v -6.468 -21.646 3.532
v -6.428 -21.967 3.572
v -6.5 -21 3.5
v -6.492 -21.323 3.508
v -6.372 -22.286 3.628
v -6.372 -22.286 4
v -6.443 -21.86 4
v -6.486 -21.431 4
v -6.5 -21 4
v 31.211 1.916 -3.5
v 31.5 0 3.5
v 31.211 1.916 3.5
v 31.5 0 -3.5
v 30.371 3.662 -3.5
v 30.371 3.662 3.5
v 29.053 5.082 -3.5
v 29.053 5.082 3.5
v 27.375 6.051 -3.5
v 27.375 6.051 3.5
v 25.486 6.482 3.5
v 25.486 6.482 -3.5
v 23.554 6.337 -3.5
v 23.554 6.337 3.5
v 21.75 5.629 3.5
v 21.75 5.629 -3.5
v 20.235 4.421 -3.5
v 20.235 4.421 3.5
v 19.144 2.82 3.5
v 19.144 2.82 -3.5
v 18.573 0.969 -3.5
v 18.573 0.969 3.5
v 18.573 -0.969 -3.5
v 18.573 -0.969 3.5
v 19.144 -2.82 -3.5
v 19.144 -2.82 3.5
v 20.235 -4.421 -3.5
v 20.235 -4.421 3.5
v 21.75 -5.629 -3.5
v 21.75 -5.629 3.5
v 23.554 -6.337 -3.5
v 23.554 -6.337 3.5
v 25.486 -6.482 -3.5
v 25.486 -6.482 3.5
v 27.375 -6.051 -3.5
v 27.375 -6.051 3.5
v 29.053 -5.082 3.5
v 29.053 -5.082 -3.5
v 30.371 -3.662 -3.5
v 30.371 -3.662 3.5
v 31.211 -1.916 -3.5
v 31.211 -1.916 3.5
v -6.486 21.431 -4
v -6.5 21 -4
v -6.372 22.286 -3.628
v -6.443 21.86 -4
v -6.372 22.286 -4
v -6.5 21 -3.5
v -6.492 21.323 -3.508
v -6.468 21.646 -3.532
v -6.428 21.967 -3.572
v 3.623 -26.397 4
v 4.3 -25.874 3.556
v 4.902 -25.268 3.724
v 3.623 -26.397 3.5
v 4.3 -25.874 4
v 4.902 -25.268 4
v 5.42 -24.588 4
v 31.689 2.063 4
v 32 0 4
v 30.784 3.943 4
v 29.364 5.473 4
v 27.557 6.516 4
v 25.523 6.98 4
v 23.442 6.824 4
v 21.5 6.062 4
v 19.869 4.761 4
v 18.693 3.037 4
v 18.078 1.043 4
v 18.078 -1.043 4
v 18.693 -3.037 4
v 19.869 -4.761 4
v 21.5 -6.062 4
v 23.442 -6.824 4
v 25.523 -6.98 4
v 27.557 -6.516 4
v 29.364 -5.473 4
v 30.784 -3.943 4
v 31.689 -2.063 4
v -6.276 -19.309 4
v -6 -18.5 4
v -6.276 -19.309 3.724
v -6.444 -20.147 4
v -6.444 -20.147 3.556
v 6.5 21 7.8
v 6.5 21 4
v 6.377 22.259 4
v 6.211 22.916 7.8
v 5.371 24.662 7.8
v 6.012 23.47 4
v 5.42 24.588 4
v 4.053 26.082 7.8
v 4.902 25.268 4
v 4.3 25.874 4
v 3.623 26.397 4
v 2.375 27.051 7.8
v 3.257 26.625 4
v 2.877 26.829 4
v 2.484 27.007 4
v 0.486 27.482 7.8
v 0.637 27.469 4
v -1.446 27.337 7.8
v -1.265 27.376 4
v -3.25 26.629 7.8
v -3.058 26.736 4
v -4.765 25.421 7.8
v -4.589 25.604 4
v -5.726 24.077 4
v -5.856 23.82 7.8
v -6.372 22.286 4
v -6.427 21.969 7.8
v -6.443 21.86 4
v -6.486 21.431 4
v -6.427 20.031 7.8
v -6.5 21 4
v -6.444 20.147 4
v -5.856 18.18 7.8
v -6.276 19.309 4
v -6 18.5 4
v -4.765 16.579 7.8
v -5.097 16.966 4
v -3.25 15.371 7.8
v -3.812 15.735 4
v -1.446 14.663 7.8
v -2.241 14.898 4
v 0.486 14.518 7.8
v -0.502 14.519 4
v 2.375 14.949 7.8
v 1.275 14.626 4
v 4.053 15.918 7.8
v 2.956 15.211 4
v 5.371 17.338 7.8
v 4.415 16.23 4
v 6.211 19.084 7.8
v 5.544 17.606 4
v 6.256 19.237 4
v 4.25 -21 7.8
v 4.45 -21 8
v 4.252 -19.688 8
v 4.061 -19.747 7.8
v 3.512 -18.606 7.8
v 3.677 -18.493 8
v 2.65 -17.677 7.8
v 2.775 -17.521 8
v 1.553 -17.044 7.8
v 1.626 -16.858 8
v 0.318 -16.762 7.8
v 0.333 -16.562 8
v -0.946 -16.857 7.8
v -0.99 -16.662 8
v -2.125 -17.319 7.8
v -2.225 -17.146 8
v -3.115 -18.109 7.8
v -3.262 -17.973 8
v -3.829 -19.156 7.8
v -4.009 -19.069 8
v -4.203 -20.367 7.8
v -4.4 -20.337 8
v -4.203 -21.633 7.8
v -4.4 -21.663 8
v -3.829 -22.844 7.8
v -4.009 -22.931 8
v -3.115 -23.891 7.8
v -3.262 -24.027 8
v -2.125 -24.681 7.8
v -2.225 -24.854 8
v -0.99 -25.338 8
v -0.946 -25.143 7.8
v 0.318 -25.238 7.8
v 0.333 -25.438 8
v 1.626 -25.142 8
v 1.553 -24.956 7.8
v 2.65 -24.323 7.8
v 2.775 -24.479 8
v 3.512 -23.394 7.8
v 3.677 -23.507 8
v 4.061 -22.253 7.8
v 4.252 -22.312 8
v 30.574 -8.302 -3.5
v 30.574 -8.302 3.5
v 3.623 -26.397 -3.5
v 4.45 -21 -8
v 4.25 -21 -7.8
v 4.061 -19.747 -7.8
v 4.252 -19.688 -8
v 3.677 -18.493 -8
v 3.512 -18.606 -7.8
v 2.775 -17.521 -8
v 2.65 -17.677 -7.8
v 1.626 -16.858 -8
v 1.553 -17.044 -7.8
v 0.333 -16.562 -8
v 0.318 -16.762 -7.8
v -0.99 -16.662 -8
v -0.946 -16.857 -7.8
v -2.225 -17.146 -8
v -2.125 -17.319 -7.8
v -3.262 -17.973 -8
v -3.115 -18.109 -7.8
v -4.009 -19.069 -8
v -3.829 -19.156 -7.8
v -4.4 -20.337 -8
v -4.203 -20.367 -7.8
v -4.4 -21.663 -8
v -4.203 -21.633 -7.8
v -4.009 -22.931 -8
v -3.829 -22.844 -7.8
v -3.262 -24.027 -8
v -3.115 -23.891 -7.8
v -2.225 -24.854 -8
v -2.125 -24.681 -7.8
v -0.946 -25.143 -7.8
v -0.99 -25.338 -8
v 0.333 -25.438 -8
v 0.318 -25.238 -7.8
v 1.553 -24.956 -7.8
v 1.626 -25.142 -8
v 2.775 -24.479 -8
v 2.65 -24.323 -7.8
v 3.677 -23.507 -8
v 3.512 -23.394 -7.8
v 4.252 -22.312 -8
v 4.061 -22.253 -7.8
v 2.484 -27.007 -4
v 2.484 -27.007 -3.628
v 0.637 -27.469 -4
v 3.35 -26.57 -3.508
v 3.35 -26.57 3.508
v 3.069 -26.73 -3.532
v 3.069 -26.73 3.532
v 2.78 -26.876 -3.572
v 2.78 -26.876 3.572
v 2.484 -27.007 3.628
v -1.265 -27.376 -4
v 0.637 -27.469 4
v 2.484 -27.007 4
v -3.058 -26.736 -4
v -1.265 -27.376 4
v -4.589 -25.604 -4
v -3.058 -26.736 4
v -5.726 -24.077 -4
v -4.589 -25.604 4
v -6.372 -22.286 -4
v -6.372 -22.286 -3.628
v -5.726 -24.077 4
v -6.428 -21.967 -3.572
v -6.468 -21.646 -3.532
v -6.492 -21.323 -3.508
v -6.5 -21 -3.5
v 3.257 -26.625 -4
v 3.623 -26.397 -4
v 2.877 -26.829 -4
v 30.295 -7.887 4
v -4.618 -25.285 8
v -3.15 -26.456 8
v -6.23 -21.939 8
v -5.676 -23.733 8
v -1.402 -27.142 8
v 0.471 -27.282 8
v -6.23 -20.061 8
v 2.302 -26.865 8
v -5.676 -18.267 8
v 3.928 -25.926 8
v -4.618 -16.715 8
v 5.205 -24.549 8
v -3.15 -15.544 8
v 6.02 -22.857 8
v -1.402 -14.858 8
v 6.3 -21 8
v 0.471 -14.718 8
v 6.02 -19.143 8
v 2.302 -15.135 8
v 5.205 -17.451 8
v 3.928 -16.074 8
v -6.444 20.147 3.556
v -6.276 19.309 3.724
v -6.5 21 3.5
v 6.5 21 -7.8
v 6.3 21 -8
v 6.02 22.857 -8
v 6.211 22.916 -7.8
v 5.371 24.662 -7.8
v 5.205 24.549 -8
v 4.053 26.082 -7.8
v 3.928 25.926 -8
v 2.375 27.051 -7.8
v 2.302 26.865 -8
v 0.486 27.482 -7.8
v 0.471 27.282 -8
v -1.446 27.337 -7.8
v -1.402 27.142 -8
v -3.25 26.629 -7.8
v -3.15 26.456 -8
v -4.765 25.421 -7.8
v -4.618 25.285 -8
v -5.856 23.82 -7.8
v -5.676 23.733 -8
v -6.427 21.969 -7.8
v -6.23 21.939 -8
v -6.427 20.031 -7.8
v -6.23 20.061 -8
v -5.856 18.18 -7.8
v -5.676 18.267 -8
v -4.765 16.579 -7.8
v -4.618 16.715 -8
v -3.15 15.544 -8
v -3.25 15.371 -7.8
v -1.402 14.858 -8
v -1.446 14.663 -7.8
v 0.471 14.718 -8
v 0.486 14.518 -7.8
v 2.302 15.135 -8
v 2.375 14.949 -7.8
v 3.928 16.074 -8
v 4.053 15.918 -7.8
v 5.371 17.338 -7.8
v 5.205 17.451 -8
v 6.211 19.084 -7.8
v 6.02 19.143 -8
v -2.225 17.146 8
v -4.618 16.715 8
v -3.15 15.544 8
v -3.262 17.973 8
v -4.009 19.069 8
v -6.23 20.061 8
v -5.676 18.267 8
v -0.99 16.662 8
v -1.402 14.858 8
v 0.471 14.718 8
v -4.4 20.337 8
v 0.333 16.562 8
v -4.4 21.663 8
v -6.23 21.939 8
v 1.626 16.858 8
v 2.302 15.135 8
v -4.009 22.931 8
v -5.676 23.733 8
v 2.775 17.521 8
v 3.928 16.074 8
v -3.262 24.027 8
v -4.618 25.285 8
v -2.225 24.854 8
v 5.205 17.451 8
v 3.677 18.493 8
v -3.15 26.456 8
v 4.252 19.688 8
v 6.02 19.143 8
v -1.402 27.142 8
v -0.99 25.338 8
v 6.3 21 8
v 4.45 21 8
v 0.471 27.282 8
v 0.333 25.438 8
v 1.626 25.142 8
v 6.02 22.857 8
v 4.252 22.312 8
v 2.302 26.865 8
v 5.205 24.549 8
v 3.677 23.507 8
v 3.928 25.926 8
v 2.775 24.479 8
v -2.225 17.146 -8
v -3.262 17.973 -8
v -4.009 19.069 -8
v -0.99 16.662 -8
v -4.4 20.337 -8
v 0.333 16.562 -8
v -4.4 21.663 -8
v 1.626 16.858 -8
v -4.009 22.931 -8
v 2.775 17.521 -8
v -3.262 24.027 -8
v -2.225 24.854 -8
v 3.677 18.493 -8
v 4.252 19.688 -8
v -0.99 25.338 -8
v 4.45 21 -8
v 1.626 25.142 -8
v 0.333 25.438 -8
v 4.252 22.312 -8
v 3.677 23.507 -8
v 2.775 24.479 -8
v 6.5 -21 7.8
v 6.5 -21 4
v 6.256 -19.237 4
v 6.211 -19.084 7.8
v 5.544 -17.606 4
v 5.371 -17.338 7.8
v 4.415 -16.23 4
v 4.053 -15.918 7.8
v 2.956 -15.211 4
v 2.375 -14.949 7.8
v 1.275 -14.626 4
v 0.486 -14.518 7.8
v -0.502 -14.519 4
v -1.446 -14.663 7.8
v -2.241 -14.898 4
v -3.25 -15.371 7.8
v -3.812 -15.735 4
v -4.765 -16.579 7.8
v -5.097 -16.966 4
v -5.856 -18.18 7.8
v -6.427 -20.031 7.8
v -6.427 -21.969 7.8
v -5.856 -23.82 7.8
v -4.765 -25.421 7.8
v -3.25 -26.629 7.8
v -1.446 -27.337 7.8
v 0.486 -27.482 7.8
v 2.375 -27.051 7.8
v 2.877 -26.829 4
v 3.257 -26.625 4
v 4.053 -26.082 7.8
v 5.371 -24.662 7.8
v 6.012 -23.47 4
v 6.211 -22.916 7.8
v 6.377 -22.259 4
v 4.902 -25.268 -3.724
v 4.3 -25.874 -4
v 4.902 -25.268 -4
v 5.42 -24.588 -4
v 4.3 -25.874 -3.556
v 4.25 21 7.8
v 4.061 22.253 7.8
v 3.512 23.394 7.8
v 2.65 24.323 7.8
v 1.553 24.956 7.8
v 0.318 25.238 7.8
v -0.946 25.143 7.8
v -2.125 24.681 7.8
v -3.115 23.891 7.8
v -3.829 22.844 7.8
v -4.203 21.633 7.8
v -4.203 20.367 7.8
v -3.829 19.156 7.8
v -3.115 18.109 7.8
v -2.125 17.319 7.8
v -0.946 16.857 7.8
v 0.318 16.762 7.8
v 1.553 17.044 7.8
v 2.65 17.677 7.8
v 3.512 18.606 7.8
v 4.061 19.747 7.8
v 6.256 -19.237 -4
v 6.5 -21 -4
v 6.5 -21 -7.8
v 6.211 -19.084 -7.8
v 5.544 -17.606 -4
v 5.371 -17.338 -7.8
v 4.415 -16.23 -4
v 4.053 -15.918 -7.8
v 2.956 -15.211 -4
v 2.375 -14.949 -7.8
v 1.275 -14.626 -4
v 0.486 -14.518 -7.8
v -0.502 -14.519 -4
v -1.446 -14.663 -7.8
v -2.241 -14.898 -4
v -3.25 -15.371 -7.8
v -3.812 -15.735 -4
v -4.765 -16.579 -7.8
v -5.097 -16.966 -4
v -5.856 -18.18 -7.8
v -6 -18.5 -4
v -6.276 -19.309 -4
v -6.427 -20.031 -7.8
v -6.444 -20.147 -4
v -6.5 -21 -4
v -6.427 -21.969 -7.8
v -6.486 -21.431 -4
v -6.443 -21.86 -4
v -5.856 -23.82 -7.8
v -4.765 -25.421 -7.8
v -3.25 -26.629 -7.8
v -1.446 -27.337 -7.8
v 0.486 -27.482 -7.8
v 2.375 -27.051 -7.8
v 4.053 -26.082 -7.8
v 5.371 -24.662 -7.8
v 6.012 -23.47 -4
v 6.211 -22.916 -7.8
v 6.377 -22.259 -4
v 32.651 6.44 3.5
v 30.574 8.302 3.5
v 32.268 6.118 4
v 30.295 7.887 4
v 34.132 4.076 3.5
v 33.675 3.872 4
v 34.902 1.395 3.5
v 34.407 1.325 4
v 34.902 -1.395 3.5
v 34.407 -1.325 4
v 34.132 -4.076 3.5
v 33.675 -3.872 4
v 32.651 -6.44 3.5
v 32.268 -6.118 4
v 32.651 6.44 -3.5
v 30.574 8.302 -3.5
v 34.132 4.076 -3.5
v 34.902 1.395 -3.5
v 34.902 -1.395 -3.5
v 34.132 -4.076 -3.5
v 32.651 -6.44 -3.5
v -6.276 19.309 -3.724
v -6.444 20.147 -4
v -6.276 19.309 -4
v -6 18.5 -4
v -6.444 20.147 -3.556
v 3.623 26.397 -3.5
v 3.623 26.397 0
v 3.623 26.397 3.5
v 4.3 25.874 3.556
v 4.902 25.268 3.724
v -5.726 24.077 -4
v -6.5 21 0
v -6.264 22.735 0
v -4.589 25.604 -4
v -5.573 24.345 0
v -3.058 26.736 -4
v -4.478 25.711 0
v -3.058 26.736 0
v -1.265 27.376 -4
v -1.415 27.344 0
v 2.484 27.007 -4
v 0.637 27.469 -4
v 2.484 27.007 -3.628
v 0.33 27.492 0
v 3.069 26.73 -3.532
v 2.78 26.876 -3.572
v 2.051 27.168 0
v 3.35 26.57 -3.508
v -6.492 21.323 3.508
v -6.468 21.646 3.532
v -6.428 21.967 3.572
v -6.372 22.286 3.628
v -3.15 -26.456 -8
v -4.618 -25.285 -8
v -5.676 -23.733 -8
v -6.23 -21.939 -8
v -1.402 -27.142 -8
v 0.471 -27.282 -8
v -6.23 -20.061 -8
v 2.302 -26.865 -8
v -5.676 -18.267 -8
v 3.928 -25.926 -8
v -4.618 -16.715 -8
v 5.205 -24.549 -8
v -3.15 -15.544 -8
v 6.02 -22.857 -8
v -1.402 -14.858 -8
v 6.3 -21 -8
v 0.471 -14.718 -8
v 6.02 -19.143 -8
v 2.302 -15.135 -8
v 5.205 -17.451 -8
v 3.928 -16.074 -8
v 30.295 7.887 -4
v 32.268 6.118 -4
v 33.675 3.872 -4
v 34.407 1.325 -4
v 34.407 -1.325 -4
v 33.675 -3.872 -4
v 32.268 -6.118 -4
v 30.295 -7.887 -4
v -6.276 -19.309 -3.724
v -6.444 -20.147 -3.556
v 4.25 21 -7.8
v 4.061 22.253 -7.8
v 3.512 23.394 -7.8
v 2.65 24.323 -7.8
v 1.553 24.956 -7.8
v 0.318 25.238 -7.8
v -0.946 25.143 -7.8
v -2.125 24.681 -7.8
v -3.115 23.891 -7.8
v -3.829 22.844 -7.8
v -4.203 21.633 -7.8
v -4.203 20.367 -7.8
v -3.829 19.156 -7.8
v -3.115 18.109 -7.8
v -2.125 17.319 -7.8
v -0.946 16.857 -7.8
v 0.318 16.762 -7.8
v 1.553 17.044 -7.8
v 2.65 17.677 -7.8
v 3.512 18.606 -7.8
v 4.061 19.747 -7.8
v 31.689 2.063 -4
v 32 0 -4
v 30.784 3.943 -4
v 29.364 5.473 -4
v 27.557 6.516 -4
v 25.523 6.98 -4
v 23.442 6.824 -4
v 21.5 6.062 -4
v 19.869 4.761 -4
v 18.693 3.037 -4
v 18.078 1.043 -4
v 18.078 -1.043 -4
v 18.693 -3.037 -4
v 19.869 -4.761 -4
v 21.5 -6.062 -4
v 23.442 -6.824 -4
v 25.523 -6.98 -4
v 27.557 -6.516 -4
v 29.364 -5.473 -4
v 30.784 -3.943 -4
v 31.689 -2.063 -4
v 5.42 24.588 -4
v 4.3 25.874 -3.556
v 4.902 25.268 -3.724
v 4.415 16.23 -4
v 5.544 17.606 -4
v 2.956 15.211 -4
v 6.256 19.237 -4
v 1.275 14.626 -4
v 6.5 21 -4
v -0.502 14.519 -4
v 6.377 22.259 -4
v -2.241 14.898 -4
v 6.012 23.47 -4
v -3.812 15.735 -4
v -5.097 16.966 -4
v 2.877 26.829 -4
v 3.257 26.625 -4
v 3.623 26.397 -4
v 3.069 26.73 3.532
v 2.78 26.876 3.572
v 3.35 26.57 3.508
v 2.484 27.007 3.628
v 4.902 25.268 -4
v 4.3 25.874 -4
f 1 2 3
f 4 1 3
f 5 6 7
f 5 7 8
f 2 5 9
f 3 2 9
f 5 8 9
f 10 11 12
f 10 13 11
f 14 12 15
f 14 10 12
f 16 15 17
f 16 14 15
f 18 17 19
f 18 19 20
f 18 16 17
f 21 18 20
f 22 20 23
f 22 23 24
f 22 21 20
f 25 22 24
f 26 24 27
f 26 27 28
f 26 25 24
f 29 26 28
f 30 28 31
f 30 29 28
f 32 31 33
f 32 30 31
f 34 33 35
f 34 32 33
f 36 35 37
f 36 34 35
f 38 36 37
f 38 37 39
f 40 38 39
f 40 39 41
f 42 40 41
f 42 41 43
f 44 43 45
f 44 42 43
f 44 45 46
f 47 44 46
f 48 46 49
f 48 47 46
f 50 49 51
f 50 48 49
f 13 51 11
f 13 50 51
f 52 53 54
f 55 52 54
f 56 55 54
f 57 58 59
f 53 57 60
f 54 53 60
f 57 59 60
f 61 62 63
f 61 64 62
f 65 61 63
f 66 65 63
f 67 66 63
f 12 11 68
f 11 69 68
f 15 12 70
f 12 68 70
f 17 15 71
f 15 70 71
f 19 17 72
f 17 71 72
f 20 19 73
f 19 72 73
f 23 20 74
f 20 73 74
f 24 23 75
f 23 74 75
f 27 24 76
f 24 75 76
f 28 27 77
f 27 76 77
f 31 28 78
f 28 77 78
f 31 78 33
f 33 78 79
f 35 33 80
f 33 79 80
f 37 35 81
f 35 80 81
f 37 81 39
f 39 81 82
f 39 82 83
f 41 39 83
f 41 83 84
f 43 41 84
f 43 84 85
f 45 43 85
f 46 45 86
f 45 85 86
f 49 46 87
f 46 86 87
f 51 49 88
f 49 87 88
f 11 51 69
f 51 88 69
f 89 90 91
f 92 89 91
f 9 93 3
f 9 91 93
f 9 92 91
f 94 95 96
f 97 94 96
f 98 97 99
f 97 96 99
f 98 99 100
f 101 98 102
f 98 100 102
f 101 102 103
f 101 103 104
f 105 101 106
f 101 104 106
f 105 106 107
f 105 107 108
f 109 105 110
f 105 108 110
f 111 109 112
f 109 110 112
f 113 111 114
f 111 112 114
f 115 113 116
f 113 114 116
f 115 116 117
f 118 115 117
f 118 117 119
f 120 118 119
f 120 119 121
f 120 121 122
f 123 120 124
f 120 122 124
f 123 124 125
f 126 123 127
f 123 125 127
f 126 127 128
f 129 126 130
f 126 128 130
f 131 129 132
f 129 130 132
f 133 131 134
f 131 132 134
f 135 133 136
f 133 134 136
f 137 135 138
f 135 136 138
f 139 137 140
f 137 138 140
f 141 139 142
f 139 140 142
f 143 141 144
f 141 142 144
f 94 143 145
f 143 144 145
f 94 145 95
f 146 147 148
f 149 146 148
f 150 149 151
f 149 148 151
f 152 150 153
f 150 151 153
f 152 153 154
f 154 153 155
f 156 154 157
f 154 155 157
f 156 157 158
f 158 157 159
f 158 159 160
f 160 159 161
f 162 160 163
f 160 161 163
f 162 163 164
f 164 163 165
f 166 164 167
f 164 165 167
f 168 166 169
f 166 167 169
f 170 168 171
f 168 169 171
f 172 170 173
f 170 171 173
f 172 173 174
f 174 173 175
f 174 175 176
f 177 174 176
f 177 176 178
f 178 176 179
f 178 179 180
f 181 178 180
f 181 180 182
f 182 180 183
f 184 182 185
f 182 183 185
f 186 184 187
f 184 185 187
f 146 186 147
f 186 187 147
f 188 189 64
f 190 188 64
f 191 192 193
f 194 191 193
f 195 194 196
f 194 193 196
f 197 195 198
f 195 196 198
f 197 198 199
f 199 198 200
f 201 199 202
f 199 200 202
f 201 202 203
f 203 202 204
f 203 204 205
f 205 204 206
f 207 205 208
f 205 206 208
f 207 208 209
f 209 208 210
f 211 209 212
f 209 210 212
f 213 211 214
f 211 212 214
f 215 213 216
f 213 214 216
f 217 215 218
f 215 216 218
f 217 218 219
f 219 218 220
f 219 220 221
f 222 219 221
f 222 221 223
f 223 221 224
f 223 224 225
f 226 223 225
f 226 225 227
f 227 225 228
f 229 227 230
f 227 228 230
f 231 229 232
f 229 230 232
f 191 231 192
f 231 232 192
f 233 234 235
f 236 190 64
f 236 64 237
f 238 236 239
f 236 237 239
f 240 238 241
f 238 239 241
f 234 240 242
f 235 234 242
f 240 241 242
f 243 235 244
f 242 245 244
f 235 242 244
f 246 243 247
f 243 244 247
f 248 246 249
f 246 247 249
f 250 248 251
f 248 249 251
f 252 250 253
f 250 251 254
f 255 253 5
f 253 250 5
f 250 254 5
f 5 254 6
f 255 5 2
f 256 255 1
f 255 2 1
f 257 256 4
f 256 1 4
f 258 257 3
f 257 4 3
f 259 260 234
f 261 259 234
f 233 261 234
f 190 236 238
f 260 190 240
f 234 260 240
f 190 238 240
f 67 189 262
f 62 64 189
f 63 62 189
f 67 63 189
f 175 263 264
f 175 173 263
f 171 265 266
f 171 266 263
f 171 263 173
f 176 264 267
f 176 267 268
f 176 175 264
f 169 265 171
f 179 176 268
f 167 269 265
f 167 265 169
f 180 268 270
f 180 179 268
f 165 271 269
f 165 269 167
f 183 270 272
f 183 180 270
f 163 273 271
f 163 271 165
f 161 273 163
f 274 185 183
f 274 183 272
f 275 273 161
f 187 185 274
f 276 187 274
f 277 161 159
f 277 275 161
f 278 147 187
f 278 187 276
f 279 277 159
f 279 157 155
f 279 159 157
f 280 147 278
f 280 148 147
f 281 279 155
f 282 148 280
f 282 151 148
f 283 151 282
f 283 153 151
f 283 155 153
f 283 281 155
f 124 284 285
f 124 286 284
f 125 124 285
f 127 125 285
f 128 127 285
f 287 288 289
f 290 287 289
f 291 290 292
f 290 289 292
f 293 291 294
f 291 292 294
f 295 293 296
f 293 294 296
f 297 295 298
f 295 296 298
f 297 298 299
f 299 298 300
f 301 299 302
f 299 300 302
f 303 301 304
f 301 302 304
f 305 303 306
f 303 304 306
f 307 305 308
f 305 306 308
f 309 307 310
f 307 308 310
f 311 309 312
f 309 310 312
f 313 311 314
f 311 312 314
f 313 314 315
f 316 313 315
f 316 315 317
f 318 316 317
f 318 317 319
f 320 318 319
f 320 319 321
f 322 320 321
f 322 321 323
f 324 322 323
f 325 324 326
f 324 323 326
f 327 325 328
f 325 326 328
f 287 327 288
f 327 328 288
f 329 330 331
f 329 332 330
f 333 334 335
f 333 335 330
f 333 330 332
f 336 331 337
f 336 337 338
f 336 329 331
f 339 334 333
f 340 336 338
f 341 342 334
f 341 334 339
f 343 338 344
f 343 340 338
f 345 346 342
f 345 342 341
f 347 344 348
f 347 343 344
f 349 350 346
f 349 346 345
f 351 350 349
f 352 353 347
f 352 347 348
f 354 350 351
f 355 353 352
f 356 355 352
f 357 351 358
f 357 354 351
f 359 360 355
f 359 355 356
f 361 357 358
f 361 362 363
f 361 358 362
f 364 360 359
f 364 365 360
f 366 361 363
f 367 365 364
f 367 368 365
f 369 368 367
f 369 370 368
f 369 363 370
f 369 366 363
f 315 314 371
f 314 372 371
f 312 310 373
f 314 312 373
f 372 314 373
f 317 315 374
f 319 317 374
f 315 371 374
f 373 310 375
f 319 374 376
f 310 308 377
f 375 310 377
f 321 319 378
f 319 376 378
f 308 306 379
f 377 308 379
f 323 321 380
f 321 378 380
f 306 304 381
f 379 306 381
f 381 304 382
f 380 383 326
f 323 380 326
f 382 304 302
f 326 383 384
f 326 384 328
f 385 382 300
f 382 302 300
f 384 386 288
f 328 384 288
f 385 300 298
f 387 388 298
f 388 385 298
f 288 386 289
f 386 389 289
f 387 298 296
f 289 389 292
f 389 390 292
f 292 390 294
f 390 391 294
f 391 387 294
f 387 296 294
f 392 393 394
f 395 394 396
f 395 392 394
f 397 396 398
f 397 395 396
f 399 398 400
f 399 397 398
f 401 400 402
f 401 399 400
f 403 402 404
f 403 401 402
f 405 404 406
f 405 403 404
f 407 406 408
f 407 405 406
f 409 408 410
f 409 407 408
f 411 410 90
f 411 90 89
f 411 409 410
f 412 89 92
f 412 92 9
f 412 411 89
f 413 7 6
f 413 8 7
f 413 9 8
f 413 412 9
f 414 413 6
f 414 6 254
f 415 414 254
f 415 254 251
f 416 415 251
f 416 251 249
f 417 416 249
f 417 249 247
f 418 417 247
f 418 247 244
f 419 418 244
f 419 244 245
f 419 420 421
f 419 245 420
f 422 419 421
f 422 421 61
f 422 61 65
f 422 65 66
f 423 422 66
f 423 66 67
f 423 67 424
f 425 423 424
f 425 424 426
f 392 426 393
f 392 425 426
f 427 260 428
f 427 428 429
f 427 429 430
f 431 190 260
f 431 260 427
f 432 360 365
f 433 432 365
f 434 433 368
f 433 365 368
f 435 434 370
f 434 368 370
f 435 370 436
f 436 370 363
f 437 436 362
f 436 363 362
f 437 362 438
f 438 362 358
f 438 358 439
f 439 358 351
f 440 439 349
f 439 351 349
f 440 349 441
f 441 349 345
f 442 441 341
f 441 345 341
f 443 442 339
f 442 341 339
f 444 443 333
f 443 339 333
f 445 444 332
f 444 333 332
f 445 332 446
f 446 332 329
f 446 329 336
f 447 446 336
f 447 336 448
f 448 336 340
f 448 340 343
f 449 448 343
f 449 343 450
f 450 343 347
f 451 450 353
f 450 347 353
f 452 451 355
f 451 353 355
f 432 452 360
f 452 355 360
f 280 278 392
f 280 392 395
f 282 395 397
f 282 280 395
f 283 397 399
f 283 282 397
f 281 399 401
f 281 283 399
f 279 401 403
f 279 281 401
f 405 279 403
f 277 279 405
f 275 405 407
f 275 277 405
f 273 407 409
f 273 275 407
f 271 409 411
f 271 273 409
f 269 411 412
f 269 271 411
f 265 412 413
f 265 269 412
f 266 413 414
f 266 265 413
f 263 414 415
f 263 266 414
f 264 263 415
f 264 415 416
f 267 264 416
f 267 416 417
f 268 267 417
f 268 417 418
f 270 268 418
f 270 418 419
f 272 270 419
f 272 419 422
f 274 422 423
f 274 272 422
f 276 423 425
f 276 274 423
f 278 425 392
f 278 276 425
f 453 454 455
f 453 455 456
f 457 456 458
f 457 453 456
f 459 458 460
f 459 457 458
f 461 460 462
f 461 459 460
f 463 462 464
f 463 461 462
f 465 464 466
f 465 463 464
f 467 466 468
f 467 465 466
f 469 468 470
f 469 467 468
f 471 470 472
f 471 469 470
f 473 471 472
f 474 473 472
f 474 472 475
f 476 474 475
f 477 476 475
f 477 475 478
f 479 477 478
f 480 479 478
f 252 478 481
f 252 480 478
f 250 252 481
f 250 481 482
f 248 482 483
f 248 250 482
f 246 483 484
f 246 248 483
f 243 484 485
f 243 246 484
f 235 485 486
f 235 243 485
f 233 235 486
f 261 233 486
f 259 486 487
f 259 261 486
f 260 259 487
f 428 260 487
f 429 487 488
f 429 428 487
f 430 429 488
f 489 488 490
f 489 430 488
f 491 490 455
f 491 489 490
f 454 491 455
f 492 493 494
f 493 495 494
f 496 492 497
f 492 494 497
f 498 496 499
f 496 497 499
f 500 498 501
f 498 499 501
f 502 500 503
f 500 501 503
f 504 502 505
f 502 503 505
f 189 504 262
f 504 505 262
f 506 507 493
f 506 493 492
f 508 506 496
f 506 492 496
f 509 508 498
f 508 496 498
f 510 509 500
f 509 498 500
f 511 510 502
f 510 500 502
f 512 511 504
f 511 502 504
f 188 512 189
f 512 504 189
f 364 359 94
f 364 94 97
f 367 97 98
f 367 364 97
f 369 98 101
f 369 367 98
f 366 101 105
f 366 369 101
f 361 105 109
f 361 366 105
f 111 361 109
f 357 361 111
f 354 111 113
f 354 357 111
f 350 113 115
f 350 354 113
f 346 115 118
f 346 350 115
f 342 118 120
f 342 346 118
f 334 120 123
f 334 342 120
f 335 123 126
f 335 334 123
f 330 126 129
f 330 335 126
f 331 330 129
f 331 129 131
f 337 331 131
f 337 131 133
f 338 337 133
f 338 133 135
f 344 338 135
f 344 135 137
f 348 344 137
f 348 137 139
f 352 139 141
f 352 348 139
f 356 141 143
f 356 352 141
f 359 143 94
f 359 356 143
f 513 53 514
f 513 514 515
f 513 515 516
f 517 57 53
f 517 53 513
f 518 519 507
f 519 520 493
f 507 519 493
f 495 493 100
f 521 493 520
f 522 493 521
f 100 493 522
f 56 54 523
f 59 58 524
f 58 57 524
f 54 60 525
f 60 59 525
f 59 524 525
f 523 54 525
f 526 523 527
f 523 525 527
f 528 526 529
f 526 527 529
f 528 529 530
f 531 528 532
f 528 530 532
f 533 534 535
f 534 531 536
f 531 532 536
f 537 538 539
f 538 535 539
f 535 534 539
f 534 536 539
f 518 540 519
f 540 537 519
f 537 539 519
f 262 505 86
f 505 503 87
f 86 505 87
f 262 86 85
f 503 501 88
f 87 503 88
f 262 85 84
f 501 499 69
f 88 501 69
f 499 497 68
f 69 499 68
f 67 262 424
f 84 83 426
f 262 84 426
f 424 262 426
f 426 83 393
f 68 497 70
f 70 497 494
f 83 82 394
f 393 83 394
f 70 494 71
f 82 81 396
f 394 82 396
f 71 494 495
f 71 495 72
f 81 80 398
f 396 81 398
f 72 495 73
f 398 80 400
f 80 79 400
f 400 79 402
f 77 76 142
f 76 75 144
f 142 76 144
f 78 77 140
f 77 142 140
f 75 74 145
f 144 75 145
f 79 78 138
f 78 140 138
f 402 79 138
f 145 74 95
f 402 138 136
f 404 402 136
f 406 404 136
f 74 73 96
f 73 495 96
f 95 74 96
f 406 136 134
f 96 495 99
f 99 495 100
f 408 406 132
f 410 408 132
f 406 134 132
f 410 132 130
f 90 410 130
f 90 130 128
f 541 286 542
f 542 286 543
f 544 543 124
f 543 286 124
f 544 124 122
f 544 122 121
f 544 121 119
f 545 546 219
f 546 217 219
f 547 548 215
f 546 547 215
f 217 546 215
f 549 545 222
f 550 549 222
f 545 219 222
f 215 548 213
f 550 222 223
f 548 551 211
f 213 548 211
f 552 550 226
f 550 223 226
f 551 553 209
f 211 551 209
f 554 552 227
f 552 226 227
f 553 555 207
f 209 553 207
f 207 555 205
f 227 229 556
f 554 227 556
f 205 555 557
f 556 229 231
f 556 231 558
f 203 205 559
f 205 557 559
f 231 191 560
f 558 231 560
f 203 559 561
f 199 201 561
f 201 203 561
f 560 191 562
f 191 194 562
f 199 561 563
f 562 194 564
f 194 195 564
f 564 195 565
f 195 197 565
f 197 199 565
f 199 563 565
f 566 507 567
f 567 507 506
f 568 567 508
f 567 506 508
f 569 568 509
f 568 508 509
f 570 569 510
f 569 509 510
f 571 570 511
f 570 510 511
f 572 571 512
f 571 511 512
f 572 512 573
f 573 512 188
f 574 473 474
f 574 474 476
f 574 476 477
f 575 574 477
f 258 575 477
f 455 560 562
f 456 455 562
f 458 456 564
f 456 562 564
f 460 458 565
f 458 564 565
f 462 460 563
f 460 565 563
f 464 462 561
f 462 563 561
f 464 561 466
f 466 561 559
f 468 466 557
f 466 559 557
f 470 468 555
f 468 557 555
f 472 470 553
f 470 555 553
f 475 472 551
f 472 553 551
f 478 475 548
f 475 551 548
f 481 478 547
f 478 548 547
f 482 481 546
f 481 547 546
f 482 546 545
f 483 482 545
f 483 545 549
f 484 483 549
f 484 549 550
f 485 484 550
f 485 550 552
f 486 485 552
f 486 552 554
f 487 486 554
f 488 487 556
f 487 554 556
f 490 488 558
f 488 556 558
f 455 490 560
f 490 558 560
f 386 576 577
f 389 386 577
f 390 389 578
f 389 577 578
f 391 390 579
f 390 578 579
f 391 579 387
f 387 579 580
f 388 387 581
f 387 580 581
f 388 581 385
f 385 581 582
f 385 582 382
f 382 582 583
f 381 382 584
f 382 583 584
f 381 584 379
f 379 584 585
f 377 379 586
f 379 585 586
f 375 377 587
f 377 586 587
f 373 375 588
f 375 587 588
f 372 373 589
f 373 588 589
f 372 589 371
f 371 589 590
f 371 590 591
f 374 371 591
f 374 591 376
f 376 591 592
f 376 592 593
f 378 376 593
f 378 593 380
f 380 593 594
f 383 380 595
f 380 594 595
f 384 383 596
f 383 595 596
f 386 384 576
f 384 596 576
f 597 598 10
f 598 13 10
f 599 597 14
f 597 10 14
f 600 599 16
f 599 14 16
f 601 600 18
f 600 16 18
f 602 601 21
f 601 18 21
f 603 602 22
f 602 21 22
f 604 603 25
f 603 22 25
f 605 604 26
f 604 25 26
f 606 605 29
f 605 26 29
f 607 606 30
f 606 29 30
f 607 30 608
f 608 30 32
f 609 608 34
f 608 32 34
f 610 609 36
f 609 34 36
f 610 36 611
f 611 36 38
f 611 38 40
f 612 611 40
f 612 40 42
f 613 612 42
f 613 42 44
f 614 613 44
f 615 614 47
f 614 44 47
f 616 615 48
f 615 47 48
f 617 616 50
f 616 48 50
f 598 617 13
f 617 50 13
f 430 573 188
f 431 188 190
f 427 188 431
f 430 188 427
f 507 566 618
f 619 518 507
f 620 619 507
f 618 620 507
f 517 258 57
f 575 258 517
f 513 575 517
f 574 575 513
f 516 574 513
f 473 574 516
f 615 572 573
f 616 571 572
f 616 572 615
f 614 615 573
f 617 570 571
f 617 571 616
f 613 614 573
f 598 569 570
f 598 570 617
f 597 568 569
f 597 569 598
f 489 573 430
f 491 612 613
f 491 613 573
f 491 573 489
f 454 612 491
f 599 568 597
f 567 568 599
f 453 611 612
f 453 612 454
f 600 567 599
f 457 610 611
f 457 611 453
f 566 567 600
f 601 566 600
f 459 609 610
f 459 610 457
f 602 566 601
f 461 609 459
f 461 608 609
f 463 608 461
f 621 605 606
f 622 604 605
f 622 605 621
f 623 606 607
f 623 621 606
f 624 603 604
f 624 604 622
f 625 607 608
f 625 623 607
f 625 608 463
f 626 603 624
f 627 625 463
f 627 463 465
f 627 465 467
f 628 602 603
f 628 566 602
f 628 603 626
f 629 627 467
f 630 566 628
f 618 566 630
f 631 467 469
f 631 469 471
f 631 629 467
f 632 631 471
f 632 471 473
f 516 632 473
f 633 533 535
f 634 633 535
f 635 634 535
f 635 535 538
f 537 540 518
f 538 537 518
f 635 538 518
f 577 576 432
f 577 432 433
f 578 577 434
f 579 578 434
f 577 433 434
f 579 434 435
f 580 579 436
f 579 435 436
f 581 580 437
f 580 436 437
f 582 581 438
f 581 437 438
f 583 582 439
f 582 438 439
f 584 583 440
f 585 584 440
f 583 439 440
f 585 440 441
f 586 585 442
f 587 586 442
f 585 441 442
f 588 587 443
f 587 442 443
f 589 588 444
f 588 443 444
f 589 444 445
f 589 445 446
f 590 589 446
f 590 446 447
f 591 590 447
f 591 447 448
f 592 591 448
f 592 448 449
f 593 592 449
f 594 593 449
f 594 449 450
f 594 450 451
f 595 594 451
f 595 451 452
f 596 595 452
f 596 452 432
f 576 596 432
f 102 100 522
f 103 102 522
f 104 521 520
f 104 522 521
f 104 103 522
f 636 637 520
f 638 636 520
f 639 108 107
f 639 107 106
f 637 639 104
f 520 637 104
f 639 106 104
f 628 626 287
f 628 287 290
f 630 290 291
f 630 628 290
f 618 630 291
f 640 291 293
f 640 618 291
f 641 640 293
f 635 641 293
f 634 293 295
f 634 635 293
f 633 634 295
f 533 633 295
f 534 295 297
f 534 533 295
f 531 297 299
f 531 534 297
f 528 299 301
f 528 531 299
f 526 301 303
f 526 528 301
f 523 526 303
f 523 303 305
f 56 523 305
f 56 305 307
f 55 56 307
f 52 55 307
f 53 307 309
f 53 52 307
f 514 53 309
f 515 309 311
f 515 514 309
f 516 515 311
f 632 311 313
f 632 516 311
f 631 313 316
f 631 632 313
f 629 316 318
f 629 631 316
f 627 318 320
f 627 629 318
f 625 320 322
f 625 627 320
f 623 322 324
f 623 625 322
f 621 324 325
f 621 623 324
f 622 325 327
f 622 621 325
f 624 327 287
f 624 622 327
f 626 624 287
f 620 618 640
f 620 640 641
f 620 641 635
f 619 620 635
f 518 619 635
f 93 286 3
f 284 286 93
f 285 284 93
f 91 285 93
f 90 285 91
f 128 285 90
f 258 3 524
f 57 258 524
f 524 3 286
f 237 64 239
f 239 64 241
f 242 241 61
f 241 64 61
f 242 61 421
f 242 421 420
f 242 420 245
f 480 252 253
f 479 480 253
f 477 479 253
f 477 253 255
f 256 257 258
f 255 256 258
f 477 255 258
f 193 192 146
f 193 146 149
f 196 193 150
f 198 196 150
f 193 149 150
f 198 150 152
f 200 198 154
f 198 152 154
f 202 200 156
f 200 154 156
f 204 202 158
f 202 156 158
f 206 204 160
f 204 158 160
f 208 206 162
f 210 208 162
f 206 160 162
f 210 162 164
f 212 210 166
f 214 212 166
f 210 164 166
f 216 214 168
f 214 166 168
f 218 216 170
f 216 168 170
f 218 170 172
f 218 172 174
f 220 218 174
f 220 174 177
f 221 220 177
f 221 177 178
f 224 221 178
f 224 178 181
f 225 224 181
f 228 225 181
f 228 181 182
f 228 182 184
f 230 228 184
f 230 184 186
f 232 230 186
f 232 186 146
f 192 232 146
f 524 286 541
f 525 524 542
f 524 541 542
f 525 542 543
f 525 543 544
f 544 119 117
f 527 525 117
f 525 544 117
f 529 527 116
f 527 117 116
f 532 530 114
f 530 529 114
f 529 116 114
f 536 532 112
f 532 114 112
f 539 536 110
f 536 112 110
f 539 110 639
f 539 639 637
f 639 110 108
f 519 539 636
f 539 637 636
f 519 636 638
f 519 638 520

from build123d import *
from build123d.topology import SkipClean

# Parameters (mm, degrees)
SKETCH1_R           = 6.5
BOSS_EXTRUDE1_DEPTH = 4
SKETCH2_R           = 6.5
BOSS_EXTRUDE2_DEPTH = 8
SKETCH3_R           = 4.25
CUT_EXTRUDE4_DEPTH  = 48.299577165
CHAMFER2_SIZE       = 0.2
CHAMFER3_SIZE       = 0.5


with BuildPart() as part:
    # Sketch1 → Boss-Extrude1 (new, symmetric)
    with BuildSketch(Plane.XY):
        with BuildLine():
            Line((-6.5, -21), (-6.5, 21))
            ThreePointArc((-6.5, 21), (-3.057753594, 26.735864622), (3.62312091, 26.396572512))
            Line((3.62312091, 26.396572512), (30.574032169, 8.302419249))
            ThreePointArc((30.574032169, 8.302419249), (35, 0), (30.574032169, -8.302419249))
            Line((30.574032169, -8.302419249), (3.62312091, -26.396572512))
            ThreePointArc((3.62312091, -26.396572512), (-3.057753594, -26.735864622), (-6.5, -21))
        make_face()
        with Locations((25, 0)):
            Circle(SKETCH1_R, mode=Mode.SUBTRACT)
    extrude(amount=BOSS_EXTRUDE1_DEPTH, both=True)

    # Sketch2 → Boss-Extrude2 (add, symmetric)
    with SkipClean():  # the faces are left unmerged after this step: merging them gives an invalid solid
        with BuildSketch(Plane.XY):
            with Locations((0, 21)):
                Circle(SKETCH2_R)
            with Locations((0, -21)):
                Circle(SKETCH2_R)
        extrude(amount=BOSS_EXTRUDE2_DEPTH, both=True)
    add(part.part.scale(1), mode=Mode.REPLACE)  # the faces are merged on a copy

    # Sketch3 → Cut-Extrude4 (cut, through all)
    with BuildSketch(Plane.XY.offset(8)):
        with Locations((0, 21)):
            Circle(SKETCH3_R)
        with Locations((0, -21)):
            Circle(SKETCH3_R)
    extrude(amount=-CUT_EXTRUDE4_DEPTH, mode=Mode.SUBTRACT)

    # Chamfer2
    chamfer2_edges = [part.edges().sort_by_distance(p)[0] for p in [
        (-6.5, 21, -8),
        (-6.5, 21, 8),
        (-6.5, -21, -8),
        (-6.5, -21, 8),
        (-4.25, 21, -8),
        (-4.25, 21, 8),
        (-4.25, -21, -8),
        (-4.25, -21, 8),
    ]]
    chamfer(chamfer2_edges, length=CHAMFER2_SIZE)

    # Chamfer3
    # the kernel refuses this chamfer: 0.5 mm, written as the material it takes off along each edge
    with BuildSketch(Plane(origin=(25, 0, 4), x_dir=(0.557403216886901, 0.8302419248653579, 0), z_dir=(-0.8302419248653579, 0.557403216886901, 0))) as chamfer3_piece_1:
        Polygon((10, CHAMFER3_SIZE), (10 - CHAMFER3_SIZE, 0), (10, 0), align=None)
    revolve(axis=Axis((25, 0, 4), (0, 0, -1)), revolution_arc=112.247195119, mode=Mode.SUBTRACT)
    with BuildSketch(Plane(origin=(2.555561393, 27.113304697, 4), x_dir=(0.01532629007386634, 0.022828229523033896, -0.9996219169112968), z_dir=(0.8302419248653579, -0.5574032168869009, 0))) as chamfer3_piece_2_section:
        Polygon((CHAMFER3_SIZE * 0.999621916911, -CHAMFER3_SIZE * 0.0274958766106), (-CHAMFER3_SIZE * 0.0274958766106, -CHAMFER3_SIZE * 0.999621916911), (0, 0), align=None)
    chamfer3_piece_2 = extrude(amount=33.74735717, mode=Mode.PRIVATE)
    chamfer3_piece_2 = chamfer3_piece_2 - Plane(origin=(0, 21, 3.833161129), x_dir=(1, 0, 0), z_dir=(0, 0, 1)) * Cylinder(6.5, 70, mode=Mode.PRIVATE)
    add(chamfer3_piece_2, mode=Mode.SUBTRACT)
    with BuildSketch(Plane(origin=(25, 0, -4), x_dir=(1, 0, 0), z_dir=(0, -1, 0))) as chamfer3_piece_3:
        Polygon((6.5 + CHAMFER3_SIZE, 0), (6.5, CHAMFER3_SIZE), (6.5, 0), align=None)
    revolve(axis=Axis((25, 0, -4), (0, 0, 1)), mode=Mode.SUBTRACT)
    with BuildSketch(Plane(origin=(25, 0, 4), x_dir=(1, 0, 0), z_dir=(0, -1, 0))) as chamfer3_piece_4:
        Polygon((6.5, -CHAMFER3_SIZE), (6.5 + CHAMFER3_SIZE, 0), (6.5, 0), align=None)
    revolve(axis=Axis((25, 0, 4), (0, 0, 1)), mode=Mode.SUBTRACT)
    with BuildSketch(Plane(origin=(-6.5, -22.285841494, 4), x_dir=(-0.027495876610585623, 0, -0.9996219169112968), z_dir=(0, 1, 0))) as chamfer3_piece_5_section:
        Polygon((CHAMFER3_SIZE * 0.999621916911, -CHAMFER3_SIZE * 0.0274958766106), (-CHAMFER3_SIZE * 0.0274958766106, -CHAMFER3_SIZE * 0.999621916911), (0, 0), align=None)
    chamfer3_piece_5 = extrude(amount=44.571682988, mode=Mode.PRIVATE)
    chamfer3_piece_5 = chamfer3_piece_5 - Plane(origin=(0, -21, 3.832044631), x_dir=(1, 0, 0), z_dir=(0, 0, 1)) * Cylinder(6.5, 92, mode=Mode.PRIVATE)
    chamfer3_piece_5 = chamfer3_piece_5 - Plane(origin=(0, 21, 3.832044631), x_dir=(1, 0, 0), z_dir=(0, 0, 1)) * Cylinder(6.5, 92, mode=Mode.PRIVATE)
    add(chamfer3_piece_5, mode=Mode.SUBTRACT)
    with BuildSketch(Plane(origin=(-6.5, -22.285841494, -4), x_dir=(0.9996219169112968, 0, -0.027495876610585647), z_dir=(0, 1, 0))) as chamfer3_piece_6_section:
        Polygon((CHAMFER3_SIZE * 0.999621916911, -CHAMFER3_SIZE * 0.0274958766106), (-CHAMFER3_SIZE * 0.0274958766106, -CHAMFER3_SIZE * 0.999621916911), (0, 0), align=None)
    chamfer3_piece_6 = extrude(amount=44.571682988, mode=Mode.PRIVATE)
    chamfer3_piece_6 = chamfer3_piece_6 - Plane(origin=(0, -21, -3.832044585), x_dir=(1, 0, 0), z_dir=(0, 0, 1)) * Cylinder(6.5, 92, mode=Mode.PRIVATE)
    chamfer3_piece_6 = chamfer3_piece_6 - Plane(origin=(0, 21, -3.832044585), x_dir=(1, 0, 0), z_dir=(0, 0, 1)) * Cylinder(6.5, 92, mode=Mode.PRIVATE)
    add(chamfer3_piece_6, mode=Mode.SUBTRACT)
    with BuildSketch(Plane(origin=(2.555561393, 27.113304697, -4), x_dir=(-0.5571924721570072, -0.8299280244340339, -0.027495876610585664), z_dir=(0.8302419248653579, -0.5574032168869009, 0))) as chamfer3_piece_7_section:
        Polygon((CHAMFER3_SIZE * 0.999621916911, -CHAMFER3_SIZE * 0.0274958766106), (-CHAMFER3_SIZE * 0.0274958766106, -CHAMFER3_SIZE * 0.999621916911), (0, 0), align=None)
    chamfer3_piece_7 = extrude(amount=33.74735717, mode=Mode.PRIVATE)
    chamfer3_piece_7 = chamfer3_piece_7 - Plane(origin=(0, 21, -3.833161129), x_dir=(1, 0, 0), z_dir=(0, 0, 1)) * Cylinder(6.5, 70, mode=Mode.PRIVATE)
    add(chamfer3_piece_7, mode=Mode.SUBTRACT)
    with BuildSketch(Plane(origin=(25, 0, -4), x_dir=(0.557403216886901, 0.8302419248653579, 0), z_dir=(-0.8302419248653579, 0.557403216886901, 0))) as chamfer3_piece_8:
        Polygon((10 - CHAMFER3_SIZE, 0), (10, -CHAMFER3_SIZE), (10, 0), align=None)
    revolve(axis=Axis((25, 0, -4), (0, 0, -1)), revolution_arc=112.247195119, mode=Mode.SUBTRACT)
    with BuildSketch(Plane(origin=(30.574032169, -8.302419249, -4), x_dir=(-0.5571924721570071, 0.8299280244340339, -0.027495876610585612), z_dir=(-0.8302419248653579, -0.5574032168869009, 0))) as chamfer3_piece_9_section:
        Polygon((CHAMFER3_SIZE * 0.999621916911, -CHAMFER3_SIZE * 0.0274958766106), (-CHAMFER3_SIZE * 0.0274958766106, -CHAMFER3_SIZE * 0.999621916911), (0, 0), align=None)
    chamfer3_piece_9 = extrude(amount=33.74735717, mode=Mode.PRIVATE)
    chamfer3_piece_9 = chamfer3_piece_9 - Plane(origin=(0, -21, -3.833161128), x_dir=(1, 0, 0), z_dir=(0, 0, 1)) * Cylinder(6.5, 70, mode=Mode.PRIVATE)
    add(chamfer3_piece_9, mode=Mode.SUBTRACT)
    with BuildSketch(Plane(origin=(30.574032169, -8.302419249, 4), x_dir=(0.015326290073865267, -0.022828229523032303, -0.9996219169112968), z_dir=(-0.8302419248653579, -0.5574032168869009, 0))) as chamfer3_piece_10_section:
        Polygon((CHAMFER3_SIZE * 0.999621916911, -CHAMFER3_SIZE * 0.0274958766106), (-CHAMFER3_SIZE * 0.0274958766106, -CHAMFER3_SIZE * 0.999621916911), (0, 0), align=None)
    chamfer3_piece_10 = extrude(amount=33.74735717, mode=Mode.PRIVATE)
    chamfer3_piece_10 = chamfer3_piece_10 - Plane(origin=(0, -21, 3.833161129), x_dir=(1, 0, 0), z_dir=(0, 0, 1)) * Cylinder(6.5, 70, mode=Mode.PRIVATE)
    add(chamfer3_piece_10, mode=Mode.SUBTRACT)


solid = part.part
